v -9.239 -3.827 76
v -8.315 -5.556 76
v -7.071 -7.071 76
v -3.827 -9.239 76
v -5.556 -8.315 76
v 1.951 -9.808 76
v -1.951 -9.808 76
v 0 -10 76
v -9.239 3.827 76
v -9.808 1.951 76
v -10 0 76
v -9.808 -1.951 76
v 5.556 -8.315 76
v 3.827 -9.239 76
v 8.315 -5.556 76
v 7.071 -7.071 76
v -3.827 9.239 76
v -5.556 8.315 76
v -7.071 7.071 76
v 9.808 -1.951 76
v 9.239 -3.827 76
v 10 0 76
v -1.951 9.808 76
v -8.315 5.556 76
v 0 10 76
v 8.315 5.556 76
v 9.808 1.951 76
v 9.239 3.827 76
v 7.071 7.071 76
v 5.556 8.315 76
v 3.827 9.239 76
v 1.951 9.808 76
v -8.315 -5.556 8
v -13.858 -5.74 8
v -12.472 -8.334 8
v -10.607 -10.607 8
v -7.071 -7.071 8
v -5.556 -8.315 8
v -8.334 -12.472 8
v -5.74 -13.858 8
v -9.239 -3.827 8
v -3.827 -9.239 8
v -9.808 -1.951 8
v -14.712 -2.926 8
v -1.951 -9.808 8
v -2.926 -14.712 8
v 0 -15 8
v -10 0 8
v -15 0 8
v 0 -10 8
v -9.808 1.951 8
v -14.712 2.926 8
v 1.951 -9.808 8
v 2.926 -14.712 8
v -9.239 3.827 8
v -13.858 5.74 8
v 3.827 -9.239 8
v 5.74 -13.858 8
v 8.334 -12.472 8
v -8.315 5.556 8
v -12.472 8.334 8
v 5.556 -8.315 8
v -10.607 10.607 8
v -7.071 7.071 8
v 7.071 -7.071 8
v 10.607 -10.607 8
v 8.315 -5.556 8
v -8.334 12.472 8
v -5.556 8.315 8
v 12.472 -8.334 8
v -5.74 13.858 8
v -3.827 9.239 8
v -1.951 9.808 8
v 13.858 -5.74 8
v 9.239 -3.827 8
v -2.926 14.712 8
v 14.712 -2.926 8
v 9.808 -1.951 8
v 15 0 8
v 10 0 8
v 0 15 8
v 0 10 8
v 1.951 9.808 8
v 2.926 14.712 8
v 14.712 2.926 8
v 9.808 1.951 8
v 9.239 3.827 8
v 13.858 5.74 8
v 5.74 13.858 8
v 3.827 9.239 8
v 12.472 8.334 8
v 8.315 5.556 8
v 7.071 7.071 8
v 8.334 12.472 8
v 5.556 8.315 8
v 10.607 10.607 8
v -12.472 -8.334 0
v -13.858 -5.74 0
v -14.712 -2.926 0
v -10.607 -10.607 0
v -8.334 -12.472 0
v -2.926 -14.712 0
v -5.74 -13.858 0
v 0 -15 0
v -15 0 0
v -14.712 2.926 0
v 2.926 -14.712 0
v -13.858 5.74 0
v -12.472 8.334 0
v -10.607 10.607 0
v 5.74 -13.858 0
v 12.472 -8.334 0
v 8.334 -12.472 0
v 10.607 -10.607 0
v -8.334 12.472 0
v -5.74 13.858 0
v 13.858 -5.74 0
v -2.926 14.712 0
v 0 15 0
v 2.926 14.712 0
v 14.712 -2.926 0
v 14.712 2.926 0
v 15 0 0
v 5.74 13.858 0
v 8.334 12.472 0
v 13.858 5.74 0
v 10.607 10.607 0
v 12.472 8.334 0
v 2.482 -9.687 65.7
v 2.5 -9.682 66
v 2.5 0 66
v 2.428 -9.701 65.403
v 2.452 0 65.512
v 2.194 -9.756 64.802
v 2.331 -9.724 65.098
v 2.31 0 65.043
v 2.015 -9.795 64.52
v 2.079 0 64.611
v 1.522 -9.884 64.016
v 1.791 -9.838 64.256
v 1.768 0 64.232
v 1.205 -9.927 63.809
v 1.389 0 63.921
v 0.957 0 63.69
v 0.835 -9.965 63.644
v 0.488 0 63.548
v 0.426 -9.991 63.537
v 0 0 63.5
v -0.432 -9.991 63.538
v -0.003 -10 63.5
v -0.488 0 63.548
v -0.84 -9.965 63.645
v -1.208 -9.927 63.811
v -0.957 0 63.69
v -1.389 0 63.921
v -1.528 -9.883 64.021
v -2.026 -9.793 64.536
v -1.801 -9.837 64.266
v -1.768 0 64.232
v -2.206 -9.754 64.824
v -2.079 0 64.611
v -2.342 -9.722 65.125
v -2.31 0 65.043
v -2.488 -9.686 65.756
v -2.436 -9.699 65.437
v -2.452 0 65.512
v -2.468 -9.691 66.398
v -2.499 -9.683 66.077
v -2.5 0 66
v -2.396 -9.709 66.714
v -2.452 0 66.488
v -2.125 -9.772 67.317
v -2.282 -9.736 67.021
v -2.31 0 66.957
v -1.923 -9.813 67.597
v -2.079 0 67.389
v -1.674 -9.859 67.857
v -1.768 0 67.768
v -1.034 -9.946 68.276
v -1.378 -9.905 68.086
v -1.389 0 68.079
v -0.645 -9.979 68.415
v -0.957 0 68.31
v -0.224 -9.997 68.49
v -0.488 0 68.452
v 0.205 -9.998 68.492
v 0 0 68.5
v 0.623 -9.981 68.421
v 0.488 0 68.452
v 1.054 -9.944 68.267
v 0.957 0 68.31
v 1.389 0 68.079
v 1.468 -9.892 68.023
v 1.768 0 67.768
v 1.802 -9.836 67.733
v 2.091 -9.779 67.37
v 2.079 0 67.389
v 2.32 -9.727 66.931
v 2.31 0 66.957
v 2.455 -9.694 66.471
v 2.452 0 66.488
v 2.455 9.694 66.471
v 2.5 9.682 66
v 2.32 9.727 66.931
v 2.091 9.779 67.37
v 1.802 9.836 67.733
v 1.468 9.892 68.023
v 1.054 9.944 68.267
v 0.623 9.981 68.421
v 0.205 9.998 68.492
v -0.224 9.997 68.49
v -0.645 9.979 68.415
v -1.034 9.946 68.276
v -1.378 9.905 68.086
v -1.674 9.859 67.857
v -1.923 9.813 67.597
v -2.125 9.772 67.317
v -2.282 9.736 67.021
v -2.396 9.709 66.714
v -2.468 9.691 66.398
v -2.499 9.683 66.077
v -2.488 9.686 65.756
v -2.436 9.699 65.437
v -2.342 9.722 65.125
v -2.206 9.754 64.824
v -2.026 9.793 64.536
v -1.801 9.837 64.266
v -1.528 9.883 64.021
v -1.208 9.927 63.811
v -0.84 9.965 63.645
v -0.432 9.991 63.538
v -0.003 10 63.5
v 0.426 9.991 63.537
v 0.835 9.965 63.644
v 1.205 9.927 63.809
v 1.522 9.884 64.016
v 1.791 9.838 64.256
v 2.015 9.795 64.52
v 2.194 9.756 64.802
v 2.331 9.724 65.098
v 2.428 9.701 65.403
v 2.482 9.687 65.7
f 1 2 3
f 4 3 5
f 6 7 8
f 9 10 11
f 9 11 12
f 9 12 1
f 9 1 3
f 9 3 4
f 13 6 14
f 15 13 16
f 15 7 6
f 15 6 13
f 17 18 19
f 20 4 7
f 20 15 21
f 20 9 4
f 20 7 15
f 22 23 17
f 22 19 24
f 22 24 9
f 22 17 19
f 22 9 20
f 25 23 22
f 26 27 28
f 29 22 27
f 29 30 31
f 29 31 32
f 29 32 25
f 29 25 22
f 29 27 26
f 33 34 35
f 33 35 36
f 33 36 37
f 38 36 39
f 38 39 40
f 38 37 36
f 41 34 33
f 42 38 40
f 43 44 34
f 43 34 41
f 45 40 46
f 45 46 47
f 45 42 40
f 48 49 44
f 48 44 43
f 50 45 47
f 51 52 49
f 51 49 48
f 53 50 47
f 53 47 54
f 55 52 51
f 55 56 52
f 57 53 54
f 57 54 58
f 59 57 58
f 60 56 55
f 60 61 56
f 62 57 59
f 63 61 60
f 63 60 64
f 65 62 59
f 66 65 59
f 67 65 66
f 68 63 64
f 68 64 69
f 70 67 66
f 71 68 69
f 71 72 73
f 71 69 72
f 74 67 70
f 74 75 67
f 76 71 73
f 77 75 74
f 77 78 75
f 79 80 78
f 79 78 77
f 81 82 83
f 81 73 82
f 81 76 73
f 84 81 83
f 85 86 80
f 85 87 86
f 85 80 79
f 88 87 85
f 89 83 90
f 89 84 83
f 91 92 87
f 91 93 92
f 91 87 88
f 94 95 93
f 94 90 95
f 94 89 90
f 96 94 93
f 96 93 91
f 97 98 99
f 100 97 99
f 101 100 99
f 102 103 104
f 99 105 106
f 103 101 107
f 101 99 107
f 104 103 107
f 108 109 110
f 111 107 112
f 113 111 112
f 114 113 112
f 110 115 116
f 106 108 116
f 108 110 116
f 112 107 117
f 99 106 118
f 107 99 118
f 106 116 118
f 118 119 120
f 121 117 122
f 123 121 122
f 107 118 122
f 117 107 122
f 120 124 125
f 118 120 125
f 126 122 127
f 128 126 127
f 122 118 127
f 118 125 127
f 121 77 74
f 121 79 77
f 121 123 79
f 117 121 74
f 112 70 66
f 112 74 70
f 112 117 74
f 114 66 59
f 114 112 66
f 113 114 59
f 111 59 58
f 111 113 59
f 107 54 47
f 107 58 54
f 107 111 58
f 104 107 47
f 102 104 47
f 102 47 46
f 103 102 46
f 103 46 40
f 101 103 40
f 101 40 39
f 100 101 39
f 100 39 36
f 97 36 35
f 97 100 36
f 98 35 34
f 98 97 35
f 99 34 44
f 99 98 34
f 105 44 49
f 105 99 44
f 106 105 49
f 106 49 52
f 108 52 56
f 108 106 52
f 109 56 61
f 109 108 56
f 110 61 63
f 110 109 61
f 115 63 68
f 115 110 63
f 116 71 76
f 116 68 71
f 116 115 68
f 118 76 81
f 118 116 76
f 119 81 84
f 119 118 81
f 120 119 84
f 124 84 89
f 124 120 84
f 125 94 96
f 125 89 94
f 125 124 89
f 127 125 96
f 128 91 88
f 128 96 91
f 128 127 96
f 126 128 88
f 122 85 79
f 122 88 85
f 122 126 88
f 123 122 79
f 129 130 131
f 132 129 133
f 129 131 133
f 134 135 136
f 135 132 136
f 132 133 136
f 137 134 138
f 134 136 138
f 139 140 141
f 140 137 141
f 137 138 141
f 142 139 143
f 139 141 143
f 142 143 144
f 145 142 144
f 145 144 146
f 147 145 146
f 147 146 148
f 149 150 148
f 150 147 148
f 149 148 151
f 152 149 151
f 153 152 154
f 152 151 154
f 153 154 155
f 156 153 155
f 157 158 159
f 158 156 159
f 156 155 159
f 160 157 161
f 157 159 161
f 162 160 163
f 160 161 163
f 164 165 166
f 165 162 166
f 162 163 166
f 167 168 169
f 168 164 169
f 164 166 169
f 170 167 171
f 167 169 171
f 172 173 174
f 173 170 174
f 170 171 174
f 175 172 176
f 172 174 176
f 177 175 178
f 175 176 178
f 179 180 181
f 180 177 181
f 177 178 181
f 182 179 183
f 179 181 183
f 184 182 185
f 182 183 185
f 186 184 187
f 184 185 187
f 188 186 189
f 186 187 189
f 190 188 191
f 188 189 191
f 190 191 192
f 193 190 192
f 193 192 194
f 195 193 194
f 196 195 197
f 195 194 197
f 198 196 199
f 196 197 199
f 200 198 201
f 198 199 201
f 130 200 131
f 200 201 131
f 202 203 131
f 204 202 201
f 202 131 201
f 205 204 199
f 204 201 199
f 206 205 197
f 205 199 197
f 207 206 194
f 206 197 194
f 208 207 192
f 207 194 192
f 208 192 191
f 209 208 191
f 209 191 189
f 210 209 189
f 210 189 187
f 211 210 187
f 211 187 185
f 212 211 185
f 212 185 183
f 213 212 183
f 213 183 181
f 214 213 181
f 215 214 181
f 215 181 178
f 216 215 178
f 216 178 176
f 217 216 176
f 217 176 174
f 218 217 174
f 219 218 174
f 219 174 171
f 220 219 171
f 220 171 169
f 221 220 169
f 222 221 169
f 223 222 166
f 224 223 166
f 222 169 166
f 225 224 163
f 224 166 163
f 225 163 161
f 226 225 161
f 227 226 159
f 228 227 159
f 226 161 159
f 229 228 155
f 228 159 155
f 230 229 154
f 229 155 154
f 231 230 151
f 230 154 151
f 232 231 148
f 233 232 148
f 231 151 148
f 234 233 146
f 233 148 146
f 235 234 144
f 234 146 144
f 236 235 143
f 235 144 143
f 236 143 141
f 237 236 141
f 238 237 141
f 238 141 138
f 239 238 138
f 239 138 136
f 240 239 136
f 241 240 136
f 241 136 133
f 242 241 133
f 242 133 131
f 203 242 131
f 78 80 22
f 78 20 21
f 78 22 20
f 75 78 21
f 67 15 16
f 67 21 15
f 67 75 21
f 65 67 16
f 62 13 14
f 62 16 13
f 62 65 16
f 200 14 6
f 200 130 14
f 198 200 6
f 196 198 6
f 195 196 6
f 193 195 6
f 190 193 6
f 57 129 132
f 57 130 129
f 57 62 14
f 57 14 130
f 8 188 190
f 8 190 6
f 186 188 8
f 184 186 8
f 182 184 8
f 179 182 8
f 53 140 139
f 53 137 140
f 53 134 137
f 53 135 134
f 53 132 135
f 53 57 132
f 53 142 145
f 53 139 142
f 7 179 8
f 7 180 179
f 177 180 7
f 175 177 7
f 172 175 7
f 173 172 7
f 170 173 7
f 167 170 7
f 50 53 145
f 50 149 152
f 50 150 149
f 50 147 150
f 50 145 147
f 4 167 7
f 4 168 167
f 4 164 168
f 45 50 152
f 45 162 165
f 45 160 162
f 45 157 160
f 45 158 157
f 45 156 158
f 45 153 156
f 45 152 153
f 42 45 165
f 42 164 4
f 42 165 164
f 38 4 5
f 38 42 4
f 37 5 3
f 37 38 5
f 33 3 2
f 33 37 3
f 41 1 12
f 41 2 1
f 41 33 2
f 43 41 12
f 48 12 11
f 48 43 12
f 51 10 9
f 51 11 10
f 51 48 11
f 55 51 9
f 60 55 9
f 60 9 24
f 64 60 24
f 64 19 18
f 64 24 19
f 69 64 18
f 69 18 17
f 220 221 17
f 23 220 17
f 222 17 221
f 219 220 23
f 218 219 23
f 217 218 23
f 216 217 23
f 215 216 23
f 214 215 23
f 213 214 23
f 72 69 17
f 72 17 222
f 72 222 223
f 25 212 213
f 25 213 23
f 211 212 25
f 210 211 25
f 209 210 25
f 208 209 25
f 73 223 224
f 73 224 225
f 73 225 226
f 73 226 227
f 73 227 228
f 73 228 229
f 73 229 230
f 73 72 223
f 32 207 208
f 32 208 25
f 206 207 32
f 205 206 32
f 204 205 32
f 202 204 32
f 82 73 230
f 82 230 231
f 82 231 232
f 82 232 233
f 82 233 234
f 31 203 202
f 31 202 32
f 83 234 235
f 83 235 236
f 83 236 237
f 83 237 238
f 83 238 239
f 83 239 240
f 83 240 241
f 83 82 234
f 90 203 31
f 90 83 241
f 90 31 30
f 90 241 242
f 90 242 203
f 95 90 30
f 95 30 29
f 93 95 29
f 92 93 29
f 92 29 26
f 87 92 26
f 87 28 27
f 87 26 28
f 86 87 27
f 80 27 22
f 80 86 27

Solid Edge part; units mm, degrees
sketch "Sketch1" plane through (0, 0, 0) normal (0, 0, 1) x (1, 0, 0)
  circle A0 centre (0, 0) radius 15
  dimension "D1" = 30
extrude "Protrusion1" add sketch "Sketch1" along normal blind 8
sketch "Sketch2" plane through (0, 0, 8) normal (0, 0, 1) x (1, 0, 0)
  circle A0 centre (0, 0) radius 10
  dimension "D1" = 20
extrude "ExtrudedProtrusion_2" add sketch "Sketch2" along normal blind 68
sketch "Sketch3" plane through (0, 0, 0) normal (0, -1, 0) x (1, 0, 0)
  circle A0 centre (0, 66) radius 2.5
  dimension "D1" = 10
extrude "ExtrudedCutout_1" cut sketch "Sketch3" along normal mid plane 66.3708
properties part number "3"
